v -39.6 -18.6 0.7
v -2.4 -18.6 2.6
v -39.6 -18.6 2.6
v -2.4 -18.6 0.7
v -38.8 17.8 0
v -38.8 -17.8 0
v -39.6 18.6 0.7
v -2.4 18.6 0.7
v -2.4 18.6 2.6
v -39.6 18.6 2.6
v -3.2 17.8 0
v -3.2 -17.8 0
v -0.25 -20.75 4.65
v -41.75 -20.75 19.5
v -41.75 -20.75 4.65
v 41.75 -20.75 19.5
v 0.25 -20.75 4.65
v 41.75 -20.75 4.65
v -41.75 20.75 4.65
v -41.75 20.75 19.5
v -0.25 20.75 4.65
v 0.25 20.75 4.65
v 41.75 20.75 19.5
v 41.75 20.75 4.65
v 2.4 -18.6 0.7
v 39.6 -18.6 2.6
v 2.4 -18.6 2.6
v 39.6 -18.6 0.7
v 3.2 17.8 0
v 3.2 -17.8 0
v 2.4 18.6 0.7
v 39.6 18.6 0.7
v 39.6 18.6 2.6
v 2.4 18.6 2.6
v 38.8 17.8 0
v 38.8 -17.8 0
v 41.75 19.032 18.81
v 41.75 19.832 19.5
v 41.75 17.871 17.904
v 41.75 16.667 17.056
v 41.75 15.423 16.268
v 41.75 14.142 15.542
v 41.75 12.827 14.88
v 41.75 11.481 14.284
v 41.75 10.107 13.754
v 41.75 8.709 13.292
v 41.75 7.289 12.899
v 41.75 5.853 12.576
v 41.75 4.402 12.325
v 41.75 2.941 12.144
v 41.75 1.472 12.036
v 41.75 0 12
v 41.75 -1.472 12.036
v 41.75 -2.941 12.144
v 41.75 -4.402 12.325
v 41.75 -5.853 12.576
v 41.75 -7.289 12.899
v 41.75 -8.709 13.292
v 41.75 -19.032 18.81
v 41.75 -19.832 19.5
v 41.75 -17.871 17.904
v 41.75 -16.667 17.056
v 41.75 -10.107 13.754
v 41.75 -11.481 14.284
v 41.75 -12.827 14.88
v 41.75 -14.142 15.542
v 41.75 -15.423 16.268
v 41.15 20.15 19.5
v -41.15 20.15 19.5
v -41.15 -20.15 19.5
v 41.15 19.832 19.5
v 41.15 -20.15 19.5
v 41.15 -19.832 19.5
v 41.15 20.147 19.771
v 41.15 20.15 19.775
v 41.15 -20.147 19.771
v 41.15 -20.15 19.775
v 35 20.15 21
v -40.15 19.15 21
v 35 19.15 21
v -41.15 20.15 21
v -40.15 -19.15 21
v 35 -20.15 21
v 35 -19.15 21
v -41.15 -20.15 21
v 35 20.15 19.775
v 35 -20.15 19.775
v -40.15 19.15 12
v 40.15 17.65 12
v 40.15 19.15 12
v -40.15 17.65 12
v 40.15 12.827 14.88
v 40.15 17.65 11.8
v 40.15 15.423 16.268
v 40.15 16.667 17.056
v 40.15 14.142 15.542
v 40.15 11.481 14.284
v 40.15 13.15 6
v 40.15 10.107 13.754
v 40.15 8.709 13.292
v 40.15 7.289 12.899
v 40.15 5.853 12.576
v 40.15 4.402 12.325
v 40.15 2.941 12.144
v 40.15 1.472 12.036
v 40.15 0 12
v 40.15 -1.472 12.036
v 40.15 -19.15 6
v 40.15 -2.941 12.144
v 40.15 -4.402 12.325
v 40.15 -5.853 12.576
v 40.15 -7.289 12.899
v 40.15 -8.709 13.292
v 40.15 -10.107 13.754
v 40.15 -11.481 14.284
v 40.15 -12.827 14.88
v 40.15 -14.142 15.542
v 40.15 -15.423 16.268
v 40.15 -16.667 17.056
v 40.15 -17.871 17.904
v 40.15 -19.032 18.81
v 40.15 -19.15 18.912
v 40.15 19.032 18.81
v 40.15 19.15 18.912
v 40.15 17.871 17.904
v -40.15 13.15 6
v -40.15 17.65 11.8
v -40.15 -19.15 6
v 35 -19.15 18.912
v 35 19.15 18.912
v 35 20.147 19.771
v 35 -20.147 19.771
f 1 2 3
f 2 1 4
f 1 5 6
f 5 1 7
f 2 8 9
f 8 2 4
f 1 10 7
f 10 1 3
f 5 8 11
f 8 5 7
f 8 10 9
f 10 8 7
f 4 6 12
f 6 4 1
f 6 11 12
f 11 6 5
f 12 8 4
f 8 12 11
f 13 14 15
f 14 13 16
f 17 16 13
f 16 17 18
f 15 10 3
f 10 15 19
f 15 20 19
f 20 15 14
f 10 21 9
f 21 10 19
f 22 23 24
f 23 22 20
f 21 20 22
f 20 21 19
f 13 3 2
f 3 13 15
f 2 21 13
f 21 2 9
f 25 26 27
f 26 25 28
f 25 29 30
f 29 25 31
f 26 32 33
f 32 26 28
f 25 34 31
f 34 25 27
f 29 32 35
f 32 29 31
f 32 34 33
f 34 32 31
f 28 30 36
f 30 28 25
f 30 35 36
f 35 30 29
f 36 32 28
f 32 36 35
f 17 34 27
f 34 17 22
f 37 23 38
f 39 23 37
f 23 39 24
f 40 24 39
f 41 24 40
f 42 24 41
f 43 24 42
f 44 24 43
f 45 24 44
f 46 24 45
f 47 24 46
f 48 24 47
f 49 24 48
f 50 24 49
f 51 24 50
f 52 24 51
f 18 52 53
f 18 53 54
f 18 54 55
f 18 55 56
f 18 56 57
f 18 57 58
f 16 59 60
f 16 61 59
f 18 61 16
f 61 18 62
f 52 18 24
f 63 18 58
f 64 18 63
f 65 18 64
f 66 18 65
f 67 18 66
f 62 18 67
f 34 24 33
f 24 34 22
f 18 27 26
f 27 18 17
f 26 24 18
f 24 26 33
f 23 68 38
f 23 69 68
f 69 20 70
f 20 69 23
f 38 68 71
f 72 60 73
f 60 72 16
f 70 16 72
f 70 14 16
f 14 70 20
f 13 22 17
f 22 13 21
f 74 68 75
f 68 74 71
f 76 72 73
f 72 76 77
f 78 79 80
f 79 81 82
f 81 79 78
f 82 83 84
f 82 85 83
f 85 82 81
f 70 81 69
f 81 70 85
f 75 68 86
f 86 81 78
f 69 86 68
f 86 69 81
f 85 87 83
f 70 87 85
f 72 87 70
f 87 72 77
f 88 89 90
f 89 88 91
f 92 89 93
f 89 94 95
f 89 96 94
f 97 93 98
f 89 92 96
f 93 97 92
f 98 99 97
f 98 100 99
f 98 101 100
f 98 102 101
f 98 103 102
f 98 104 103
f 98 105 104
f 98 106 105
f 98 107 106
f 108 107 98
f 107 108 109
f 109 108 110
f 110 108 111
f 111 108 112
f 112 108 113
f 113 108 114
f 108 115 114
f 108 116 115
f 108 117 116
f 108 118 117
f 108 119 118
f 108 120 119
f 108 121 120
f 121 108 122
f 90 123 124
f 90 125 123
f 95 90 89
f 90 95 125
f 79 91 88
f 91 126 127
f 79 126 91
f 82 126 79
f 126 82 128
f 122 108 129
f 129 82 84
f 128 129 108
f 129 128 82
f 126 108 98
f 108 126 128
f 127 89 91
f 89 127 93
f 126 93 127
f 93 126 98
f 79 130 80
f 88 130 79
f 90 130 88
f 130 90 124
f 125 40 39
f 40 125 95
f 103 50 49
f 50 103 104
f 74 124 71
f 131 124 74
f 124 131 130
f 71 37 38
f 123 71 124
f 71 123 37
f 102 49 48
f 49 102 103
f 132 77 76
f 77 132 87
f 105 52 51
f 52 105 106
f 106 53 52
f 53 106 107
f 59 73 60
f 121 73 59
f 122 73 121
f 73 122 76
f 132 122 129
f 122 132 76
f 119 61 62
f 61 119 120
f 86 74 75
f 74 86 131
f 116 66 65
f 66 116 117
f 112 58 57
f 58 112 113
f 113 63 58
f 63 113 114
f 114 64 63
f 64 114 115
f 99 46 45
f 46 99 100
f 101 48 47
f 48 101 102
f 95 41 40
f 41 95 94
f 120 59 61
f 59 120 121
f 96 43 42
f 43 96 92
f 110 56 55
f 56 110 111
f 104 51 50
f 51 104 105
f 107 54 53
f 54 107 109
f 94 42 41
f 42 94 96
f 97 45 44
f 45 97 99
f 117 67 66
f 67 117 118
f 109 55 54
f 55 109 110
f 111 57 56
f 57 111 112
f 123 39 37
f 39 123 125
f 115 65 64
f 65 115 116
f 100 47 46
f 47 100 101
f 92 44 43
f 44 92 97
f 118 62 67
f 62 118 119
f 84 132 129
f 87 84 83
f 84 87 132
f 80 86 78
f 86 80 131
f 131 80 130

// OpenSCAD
// Gridfinity bin, 2x1 x 3U tall
// Outside 83.5 x 41.5 mm, height 21 mm (3x7mm), PLA, 0.4mm nozzle, no supports
// Print orientation: +Z up, bottom (foot bottoms) on bed at z=0

Lx = 83.5;
Ly = 41.5;
H = 21;
foot_z0 = 0;
foot_z1 = 0.8;
foot_z2 = 2.6;   // 0.8+1.8
foot_z3 = 4.75;  // 0.8+1.8+2.15
foot_btm = 35.6; // 41.5-5.9
foot_mid = 37.2; // 35.6+1.6
foot_top = 41.5;
wall_t = 1.6;
floor_z = 6.0;
lip_z = 19.5;
lip_inset = 0.6;

echo(cadverify_spec = [
    ["bounds", [[-41.75, -20.75, 0], [41.75, 20.75, 21]]],
    ["bodies", 1],
    ["through_holes", 0],
    ["support_faces", [["bed", "-z", 2000]]],
    ["overhangs_allowed", []],
    ["copies", 1],
    ["details", [
        ["foot_left", "material", [[-30, -10, 0.1], [-12, 10, 0.7]], 0.9],
        ["foot_right", "material", [[12, -10, 0.1], [30, 10, 0.7]], 0.9],
        ["stack_lip", "material", [[-20, 19.3, 19.6], [20, 20.0, 20.9]], 0.9],
        ["label_shelf", "material", [[-30, 16, 6.5], [30, 18.5, 8]], 0.9],
        ["scoop_void", "void", [[40.5, -10, 14], [42.5, 10, 20]], 0.9],
        ["wall_side", "thickness", [38, 22, 10], [0, -1, 0], 1.6],
        ["floor", "thickness", [-21, 0, -5], [0, 0, 1], 6.0],
        ["foot_profile", "view", [[-39, -18, 0], [-3, 18, 5]]],
        ["scoop_view", "view", [[35, -15, 10], [43, 15, 22]]],
        ["label_view", "view", [[-10, 12, 6], [10, 20, 13]]],
        ["lip_view", "view", [[-15, 18.5, 18.5], [15, 21, 21.5]]]
    ]]
]);

module foot(cx) {
    translate([cx, 0, 0]) {
        // bottom 45deg frustum: 35.6 -> 37.2 over 0.8
        hull() {
            translate([-foot_btm/2, -foot_btm/2, 0]) cube([foot_btm, foot_btm, 0.1]);
            translate([-foot_mid/2, -foot_mid/2, foot_z1-0.1]) cube([foot_mid, foot_mid, 0.1]);
        }
        // vertical 1.8
        translate([-foot_mid/2, -foot_mid/2, foot_z1]) cube([foot_mid, foot_mid, foot_z2-foot_z1]);
        // top 45deg frustum: 37.2 -> 41.5 over 2.15
        hull() {
            translate([-foot_mid/2, -foot_mid/2, foot_z2]) cube([foot_mid, foot_mid, 0.1]);
            translate([-foot_top/2, -foot_top/2, foot_z3-0.1]) cube([foot_top, foot_top, 0.1]);
        }
    }
}

module bin_solid() {
    foot(-21);
    foot(21);
    // main outer body, overlap feet top by 0.1
    translate([-Lx/2, -Ly/2, foot_z3-0.1]) cube([Lx, Ly, lip_z-(foot_z3-0.1)]);
    // stacking lip: stepped inward 0.6 per side, no overhang
    translate([-(Lx-2*lip_inset)/2, -(Ly-2*lip_inset)/2, lip_z]) cube([Lx-2*lip_inset, Ly-2*lip_inset, H-lip_z]);
    // label shelf wedge along +Y inside, sits on floor against wall
    // y_in=19.15, bottom from 13.15 to 19.35, top from 17.65 to 19.35
    hull() {
        translate([-35, 13.15, 5.9]) cube([70, 19.35-13.15, 0.2]);
        translate([-35, 17.65, 11.9]) cube([70, 19.35-17.65, 0.2]);
    }
}

module bin() {
    x_in = (Lx-2*wall_t)/2;
    y_in0 = -(Ly-2*wall_t)/2;
    y_in1 = (Ly-2*wall_t)/2;
    shelf_y0 = 13.15;
    shelf_y1 = 17.65;
    shelf_z0 = 6.0;
    shelf_z1 = 12.0;
    difference() {
        bin_solid();
        // lower cavity, fronted by label shelf slope on +Y
        hull() {
            translate([-x_in, y_in0, shelf_z0]) cube([2*x_in, shelf_y0-y_in0, 0.2]);
            translate([-x_in, y_in0, shelf_z1-0.2]) cube([2*x_in, shelf_y1-y_in0, 0.2]);
        }
        // upper cavity full width
        translate([-x_in, y_in0, shelf_z1]) cube([2*x_in, y_in1-y_in0, H-shelf_z1+1]);
        // scoop at +X front: cylinder axis X, R30 center z42 -> bottom 12 at center
        translate([41.0, 0, 42]) rotate([0, 90, 0]) cylinder(r=30, h=12, center=true, $fn=128);
    }
}

bin();
